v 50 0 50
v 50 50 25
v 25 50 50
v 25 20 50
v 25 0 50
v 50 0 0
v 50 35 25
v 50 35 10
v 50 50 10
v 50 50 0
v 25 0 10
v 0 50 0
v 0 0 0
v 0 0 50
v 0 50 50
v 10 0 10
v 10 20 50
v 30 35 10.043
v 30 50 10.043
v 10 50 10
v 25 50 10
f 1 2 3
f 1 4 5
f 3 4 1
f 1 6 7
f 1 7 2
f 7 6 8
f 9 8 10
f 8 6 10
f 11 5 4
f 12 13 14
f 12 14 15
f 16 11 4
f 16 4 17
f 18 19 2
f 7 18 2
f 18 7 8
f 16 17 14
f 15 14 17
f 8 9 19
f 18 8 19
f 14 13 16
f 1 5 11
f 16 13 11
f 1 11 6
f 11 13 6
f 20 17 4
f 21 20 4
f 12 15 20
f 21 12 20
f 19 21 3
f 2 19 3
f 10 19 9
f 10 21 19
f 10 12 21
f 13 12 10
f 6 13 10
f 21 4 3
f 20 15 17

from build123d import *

# Parameters (mm, degrees)
F0_W      = 50
F0_H      = 50
F1_DEPTH  = 50
F11_W     = 15
F11_H     = 20
F14_W     = 15
F14_H     = 30
F18_DEPTH = 15


with BuildPart() as f1:
    # F0 (on Top) → F1 (new body)
    with BuildSketch(Plane.XY):
        with Locations((25, 25)):
            Rectangle(F0_W, F0_H)
    extrude(amount=F1_DEPTH)

    # F4: sweep along a path in F3
    with BuildLine(Plane(origin=(0, 0, 0), x_dir=(0, -1, 0), z_dir=(-1, 0, 0))) as f4_path:
        Line((-20, 50), (-50, 10))
    # F2 (on face) → F4 (sweep, cut)
    with BuildSketch(Plane.XY.offset(50)):
        Polygon((10, 50), (0, 50), (10, 20), align=None)
    sweep(path=f4_path.line, mode=Mode.SUBTRACT)

    # F7: sweep along a path in F6
    with BuildLine(Plane(origin=(0, 0, 0), x_dir=(0, -1, 0), z_dir=(-1, 0, 0))) as f7_path:
        Line((-20, 50), (0, 10))
    # F5 (on face) → F7 (sweep, cut)
    with BuildSketch(Plane.XY.offset(50)):
        Polygon((10, 0), (10, 20), (0, 0), align=None)
    sweep(path=f7_path.line, mode=Mode.SUBTRACT)

    # F10: sweep along a path in F9
    with BuildLine(Plane.YZ.offset(50)) as f10_path:
        Line((0, 50), (50, 25))
    # F8 (on face) → F10 (sweep, cut)
    with BuildSketch(Plane.XY.offset(50)):
        Polygon((50, 50), (25, 50), (50, 0), align=None)
    sweep(path=f10_path.line, mode=Mode.SUBTRACT)

    # F13: sweep along a path in F12
    with BuildLine(Plane(origin=(0, 0, 0), x_dir=(0, -1, 0), z_dir=(-1, 0, 0))) as f13_path:
        Line((-20, 50), (0, 10))
    # F11 (on face) → F13 (sweep, cut)
    with BuildSketch(Plane.XY.offset(50)):
        with Locations((17.5, 10)):
            Rectangle(F11_W, F11_H)
    sweep(path=f13_path.line, mode=Mode.SUBTRACT)

    # F16: sweep along a path in F15
    with BuildLine(Plane(origin=(0, 0, 0), x_dir=(0, -1, 0), z_dir=(-1, 0, 0))) as f16_path:
        Line((-20, 50), (-50, 10))
    # F14 (on face) → F16 (sweep, cut)
    with BuildSketch(Plane.XY.offset(50)):
        with Locations((17.5, 35)):
            Rectangle(F14_W, F14_H)
    sweep(path=f16_path.line, mode=Mode.SUBTRACT)

    # F17 (on face) → F18 (cut)
    with BuildSketch(Plane(origin=(0, 50, 0), x_dir=(-1, 0, 0), z_dir=(0, 1, 0))):
        Polygon((-30.000045, 10.042553), (-50, 25), (-50, 10), align=None)
    extrude(amount=-F18_DEPTH, mode=Mode.SUBTRACT)


solid = f1.part
